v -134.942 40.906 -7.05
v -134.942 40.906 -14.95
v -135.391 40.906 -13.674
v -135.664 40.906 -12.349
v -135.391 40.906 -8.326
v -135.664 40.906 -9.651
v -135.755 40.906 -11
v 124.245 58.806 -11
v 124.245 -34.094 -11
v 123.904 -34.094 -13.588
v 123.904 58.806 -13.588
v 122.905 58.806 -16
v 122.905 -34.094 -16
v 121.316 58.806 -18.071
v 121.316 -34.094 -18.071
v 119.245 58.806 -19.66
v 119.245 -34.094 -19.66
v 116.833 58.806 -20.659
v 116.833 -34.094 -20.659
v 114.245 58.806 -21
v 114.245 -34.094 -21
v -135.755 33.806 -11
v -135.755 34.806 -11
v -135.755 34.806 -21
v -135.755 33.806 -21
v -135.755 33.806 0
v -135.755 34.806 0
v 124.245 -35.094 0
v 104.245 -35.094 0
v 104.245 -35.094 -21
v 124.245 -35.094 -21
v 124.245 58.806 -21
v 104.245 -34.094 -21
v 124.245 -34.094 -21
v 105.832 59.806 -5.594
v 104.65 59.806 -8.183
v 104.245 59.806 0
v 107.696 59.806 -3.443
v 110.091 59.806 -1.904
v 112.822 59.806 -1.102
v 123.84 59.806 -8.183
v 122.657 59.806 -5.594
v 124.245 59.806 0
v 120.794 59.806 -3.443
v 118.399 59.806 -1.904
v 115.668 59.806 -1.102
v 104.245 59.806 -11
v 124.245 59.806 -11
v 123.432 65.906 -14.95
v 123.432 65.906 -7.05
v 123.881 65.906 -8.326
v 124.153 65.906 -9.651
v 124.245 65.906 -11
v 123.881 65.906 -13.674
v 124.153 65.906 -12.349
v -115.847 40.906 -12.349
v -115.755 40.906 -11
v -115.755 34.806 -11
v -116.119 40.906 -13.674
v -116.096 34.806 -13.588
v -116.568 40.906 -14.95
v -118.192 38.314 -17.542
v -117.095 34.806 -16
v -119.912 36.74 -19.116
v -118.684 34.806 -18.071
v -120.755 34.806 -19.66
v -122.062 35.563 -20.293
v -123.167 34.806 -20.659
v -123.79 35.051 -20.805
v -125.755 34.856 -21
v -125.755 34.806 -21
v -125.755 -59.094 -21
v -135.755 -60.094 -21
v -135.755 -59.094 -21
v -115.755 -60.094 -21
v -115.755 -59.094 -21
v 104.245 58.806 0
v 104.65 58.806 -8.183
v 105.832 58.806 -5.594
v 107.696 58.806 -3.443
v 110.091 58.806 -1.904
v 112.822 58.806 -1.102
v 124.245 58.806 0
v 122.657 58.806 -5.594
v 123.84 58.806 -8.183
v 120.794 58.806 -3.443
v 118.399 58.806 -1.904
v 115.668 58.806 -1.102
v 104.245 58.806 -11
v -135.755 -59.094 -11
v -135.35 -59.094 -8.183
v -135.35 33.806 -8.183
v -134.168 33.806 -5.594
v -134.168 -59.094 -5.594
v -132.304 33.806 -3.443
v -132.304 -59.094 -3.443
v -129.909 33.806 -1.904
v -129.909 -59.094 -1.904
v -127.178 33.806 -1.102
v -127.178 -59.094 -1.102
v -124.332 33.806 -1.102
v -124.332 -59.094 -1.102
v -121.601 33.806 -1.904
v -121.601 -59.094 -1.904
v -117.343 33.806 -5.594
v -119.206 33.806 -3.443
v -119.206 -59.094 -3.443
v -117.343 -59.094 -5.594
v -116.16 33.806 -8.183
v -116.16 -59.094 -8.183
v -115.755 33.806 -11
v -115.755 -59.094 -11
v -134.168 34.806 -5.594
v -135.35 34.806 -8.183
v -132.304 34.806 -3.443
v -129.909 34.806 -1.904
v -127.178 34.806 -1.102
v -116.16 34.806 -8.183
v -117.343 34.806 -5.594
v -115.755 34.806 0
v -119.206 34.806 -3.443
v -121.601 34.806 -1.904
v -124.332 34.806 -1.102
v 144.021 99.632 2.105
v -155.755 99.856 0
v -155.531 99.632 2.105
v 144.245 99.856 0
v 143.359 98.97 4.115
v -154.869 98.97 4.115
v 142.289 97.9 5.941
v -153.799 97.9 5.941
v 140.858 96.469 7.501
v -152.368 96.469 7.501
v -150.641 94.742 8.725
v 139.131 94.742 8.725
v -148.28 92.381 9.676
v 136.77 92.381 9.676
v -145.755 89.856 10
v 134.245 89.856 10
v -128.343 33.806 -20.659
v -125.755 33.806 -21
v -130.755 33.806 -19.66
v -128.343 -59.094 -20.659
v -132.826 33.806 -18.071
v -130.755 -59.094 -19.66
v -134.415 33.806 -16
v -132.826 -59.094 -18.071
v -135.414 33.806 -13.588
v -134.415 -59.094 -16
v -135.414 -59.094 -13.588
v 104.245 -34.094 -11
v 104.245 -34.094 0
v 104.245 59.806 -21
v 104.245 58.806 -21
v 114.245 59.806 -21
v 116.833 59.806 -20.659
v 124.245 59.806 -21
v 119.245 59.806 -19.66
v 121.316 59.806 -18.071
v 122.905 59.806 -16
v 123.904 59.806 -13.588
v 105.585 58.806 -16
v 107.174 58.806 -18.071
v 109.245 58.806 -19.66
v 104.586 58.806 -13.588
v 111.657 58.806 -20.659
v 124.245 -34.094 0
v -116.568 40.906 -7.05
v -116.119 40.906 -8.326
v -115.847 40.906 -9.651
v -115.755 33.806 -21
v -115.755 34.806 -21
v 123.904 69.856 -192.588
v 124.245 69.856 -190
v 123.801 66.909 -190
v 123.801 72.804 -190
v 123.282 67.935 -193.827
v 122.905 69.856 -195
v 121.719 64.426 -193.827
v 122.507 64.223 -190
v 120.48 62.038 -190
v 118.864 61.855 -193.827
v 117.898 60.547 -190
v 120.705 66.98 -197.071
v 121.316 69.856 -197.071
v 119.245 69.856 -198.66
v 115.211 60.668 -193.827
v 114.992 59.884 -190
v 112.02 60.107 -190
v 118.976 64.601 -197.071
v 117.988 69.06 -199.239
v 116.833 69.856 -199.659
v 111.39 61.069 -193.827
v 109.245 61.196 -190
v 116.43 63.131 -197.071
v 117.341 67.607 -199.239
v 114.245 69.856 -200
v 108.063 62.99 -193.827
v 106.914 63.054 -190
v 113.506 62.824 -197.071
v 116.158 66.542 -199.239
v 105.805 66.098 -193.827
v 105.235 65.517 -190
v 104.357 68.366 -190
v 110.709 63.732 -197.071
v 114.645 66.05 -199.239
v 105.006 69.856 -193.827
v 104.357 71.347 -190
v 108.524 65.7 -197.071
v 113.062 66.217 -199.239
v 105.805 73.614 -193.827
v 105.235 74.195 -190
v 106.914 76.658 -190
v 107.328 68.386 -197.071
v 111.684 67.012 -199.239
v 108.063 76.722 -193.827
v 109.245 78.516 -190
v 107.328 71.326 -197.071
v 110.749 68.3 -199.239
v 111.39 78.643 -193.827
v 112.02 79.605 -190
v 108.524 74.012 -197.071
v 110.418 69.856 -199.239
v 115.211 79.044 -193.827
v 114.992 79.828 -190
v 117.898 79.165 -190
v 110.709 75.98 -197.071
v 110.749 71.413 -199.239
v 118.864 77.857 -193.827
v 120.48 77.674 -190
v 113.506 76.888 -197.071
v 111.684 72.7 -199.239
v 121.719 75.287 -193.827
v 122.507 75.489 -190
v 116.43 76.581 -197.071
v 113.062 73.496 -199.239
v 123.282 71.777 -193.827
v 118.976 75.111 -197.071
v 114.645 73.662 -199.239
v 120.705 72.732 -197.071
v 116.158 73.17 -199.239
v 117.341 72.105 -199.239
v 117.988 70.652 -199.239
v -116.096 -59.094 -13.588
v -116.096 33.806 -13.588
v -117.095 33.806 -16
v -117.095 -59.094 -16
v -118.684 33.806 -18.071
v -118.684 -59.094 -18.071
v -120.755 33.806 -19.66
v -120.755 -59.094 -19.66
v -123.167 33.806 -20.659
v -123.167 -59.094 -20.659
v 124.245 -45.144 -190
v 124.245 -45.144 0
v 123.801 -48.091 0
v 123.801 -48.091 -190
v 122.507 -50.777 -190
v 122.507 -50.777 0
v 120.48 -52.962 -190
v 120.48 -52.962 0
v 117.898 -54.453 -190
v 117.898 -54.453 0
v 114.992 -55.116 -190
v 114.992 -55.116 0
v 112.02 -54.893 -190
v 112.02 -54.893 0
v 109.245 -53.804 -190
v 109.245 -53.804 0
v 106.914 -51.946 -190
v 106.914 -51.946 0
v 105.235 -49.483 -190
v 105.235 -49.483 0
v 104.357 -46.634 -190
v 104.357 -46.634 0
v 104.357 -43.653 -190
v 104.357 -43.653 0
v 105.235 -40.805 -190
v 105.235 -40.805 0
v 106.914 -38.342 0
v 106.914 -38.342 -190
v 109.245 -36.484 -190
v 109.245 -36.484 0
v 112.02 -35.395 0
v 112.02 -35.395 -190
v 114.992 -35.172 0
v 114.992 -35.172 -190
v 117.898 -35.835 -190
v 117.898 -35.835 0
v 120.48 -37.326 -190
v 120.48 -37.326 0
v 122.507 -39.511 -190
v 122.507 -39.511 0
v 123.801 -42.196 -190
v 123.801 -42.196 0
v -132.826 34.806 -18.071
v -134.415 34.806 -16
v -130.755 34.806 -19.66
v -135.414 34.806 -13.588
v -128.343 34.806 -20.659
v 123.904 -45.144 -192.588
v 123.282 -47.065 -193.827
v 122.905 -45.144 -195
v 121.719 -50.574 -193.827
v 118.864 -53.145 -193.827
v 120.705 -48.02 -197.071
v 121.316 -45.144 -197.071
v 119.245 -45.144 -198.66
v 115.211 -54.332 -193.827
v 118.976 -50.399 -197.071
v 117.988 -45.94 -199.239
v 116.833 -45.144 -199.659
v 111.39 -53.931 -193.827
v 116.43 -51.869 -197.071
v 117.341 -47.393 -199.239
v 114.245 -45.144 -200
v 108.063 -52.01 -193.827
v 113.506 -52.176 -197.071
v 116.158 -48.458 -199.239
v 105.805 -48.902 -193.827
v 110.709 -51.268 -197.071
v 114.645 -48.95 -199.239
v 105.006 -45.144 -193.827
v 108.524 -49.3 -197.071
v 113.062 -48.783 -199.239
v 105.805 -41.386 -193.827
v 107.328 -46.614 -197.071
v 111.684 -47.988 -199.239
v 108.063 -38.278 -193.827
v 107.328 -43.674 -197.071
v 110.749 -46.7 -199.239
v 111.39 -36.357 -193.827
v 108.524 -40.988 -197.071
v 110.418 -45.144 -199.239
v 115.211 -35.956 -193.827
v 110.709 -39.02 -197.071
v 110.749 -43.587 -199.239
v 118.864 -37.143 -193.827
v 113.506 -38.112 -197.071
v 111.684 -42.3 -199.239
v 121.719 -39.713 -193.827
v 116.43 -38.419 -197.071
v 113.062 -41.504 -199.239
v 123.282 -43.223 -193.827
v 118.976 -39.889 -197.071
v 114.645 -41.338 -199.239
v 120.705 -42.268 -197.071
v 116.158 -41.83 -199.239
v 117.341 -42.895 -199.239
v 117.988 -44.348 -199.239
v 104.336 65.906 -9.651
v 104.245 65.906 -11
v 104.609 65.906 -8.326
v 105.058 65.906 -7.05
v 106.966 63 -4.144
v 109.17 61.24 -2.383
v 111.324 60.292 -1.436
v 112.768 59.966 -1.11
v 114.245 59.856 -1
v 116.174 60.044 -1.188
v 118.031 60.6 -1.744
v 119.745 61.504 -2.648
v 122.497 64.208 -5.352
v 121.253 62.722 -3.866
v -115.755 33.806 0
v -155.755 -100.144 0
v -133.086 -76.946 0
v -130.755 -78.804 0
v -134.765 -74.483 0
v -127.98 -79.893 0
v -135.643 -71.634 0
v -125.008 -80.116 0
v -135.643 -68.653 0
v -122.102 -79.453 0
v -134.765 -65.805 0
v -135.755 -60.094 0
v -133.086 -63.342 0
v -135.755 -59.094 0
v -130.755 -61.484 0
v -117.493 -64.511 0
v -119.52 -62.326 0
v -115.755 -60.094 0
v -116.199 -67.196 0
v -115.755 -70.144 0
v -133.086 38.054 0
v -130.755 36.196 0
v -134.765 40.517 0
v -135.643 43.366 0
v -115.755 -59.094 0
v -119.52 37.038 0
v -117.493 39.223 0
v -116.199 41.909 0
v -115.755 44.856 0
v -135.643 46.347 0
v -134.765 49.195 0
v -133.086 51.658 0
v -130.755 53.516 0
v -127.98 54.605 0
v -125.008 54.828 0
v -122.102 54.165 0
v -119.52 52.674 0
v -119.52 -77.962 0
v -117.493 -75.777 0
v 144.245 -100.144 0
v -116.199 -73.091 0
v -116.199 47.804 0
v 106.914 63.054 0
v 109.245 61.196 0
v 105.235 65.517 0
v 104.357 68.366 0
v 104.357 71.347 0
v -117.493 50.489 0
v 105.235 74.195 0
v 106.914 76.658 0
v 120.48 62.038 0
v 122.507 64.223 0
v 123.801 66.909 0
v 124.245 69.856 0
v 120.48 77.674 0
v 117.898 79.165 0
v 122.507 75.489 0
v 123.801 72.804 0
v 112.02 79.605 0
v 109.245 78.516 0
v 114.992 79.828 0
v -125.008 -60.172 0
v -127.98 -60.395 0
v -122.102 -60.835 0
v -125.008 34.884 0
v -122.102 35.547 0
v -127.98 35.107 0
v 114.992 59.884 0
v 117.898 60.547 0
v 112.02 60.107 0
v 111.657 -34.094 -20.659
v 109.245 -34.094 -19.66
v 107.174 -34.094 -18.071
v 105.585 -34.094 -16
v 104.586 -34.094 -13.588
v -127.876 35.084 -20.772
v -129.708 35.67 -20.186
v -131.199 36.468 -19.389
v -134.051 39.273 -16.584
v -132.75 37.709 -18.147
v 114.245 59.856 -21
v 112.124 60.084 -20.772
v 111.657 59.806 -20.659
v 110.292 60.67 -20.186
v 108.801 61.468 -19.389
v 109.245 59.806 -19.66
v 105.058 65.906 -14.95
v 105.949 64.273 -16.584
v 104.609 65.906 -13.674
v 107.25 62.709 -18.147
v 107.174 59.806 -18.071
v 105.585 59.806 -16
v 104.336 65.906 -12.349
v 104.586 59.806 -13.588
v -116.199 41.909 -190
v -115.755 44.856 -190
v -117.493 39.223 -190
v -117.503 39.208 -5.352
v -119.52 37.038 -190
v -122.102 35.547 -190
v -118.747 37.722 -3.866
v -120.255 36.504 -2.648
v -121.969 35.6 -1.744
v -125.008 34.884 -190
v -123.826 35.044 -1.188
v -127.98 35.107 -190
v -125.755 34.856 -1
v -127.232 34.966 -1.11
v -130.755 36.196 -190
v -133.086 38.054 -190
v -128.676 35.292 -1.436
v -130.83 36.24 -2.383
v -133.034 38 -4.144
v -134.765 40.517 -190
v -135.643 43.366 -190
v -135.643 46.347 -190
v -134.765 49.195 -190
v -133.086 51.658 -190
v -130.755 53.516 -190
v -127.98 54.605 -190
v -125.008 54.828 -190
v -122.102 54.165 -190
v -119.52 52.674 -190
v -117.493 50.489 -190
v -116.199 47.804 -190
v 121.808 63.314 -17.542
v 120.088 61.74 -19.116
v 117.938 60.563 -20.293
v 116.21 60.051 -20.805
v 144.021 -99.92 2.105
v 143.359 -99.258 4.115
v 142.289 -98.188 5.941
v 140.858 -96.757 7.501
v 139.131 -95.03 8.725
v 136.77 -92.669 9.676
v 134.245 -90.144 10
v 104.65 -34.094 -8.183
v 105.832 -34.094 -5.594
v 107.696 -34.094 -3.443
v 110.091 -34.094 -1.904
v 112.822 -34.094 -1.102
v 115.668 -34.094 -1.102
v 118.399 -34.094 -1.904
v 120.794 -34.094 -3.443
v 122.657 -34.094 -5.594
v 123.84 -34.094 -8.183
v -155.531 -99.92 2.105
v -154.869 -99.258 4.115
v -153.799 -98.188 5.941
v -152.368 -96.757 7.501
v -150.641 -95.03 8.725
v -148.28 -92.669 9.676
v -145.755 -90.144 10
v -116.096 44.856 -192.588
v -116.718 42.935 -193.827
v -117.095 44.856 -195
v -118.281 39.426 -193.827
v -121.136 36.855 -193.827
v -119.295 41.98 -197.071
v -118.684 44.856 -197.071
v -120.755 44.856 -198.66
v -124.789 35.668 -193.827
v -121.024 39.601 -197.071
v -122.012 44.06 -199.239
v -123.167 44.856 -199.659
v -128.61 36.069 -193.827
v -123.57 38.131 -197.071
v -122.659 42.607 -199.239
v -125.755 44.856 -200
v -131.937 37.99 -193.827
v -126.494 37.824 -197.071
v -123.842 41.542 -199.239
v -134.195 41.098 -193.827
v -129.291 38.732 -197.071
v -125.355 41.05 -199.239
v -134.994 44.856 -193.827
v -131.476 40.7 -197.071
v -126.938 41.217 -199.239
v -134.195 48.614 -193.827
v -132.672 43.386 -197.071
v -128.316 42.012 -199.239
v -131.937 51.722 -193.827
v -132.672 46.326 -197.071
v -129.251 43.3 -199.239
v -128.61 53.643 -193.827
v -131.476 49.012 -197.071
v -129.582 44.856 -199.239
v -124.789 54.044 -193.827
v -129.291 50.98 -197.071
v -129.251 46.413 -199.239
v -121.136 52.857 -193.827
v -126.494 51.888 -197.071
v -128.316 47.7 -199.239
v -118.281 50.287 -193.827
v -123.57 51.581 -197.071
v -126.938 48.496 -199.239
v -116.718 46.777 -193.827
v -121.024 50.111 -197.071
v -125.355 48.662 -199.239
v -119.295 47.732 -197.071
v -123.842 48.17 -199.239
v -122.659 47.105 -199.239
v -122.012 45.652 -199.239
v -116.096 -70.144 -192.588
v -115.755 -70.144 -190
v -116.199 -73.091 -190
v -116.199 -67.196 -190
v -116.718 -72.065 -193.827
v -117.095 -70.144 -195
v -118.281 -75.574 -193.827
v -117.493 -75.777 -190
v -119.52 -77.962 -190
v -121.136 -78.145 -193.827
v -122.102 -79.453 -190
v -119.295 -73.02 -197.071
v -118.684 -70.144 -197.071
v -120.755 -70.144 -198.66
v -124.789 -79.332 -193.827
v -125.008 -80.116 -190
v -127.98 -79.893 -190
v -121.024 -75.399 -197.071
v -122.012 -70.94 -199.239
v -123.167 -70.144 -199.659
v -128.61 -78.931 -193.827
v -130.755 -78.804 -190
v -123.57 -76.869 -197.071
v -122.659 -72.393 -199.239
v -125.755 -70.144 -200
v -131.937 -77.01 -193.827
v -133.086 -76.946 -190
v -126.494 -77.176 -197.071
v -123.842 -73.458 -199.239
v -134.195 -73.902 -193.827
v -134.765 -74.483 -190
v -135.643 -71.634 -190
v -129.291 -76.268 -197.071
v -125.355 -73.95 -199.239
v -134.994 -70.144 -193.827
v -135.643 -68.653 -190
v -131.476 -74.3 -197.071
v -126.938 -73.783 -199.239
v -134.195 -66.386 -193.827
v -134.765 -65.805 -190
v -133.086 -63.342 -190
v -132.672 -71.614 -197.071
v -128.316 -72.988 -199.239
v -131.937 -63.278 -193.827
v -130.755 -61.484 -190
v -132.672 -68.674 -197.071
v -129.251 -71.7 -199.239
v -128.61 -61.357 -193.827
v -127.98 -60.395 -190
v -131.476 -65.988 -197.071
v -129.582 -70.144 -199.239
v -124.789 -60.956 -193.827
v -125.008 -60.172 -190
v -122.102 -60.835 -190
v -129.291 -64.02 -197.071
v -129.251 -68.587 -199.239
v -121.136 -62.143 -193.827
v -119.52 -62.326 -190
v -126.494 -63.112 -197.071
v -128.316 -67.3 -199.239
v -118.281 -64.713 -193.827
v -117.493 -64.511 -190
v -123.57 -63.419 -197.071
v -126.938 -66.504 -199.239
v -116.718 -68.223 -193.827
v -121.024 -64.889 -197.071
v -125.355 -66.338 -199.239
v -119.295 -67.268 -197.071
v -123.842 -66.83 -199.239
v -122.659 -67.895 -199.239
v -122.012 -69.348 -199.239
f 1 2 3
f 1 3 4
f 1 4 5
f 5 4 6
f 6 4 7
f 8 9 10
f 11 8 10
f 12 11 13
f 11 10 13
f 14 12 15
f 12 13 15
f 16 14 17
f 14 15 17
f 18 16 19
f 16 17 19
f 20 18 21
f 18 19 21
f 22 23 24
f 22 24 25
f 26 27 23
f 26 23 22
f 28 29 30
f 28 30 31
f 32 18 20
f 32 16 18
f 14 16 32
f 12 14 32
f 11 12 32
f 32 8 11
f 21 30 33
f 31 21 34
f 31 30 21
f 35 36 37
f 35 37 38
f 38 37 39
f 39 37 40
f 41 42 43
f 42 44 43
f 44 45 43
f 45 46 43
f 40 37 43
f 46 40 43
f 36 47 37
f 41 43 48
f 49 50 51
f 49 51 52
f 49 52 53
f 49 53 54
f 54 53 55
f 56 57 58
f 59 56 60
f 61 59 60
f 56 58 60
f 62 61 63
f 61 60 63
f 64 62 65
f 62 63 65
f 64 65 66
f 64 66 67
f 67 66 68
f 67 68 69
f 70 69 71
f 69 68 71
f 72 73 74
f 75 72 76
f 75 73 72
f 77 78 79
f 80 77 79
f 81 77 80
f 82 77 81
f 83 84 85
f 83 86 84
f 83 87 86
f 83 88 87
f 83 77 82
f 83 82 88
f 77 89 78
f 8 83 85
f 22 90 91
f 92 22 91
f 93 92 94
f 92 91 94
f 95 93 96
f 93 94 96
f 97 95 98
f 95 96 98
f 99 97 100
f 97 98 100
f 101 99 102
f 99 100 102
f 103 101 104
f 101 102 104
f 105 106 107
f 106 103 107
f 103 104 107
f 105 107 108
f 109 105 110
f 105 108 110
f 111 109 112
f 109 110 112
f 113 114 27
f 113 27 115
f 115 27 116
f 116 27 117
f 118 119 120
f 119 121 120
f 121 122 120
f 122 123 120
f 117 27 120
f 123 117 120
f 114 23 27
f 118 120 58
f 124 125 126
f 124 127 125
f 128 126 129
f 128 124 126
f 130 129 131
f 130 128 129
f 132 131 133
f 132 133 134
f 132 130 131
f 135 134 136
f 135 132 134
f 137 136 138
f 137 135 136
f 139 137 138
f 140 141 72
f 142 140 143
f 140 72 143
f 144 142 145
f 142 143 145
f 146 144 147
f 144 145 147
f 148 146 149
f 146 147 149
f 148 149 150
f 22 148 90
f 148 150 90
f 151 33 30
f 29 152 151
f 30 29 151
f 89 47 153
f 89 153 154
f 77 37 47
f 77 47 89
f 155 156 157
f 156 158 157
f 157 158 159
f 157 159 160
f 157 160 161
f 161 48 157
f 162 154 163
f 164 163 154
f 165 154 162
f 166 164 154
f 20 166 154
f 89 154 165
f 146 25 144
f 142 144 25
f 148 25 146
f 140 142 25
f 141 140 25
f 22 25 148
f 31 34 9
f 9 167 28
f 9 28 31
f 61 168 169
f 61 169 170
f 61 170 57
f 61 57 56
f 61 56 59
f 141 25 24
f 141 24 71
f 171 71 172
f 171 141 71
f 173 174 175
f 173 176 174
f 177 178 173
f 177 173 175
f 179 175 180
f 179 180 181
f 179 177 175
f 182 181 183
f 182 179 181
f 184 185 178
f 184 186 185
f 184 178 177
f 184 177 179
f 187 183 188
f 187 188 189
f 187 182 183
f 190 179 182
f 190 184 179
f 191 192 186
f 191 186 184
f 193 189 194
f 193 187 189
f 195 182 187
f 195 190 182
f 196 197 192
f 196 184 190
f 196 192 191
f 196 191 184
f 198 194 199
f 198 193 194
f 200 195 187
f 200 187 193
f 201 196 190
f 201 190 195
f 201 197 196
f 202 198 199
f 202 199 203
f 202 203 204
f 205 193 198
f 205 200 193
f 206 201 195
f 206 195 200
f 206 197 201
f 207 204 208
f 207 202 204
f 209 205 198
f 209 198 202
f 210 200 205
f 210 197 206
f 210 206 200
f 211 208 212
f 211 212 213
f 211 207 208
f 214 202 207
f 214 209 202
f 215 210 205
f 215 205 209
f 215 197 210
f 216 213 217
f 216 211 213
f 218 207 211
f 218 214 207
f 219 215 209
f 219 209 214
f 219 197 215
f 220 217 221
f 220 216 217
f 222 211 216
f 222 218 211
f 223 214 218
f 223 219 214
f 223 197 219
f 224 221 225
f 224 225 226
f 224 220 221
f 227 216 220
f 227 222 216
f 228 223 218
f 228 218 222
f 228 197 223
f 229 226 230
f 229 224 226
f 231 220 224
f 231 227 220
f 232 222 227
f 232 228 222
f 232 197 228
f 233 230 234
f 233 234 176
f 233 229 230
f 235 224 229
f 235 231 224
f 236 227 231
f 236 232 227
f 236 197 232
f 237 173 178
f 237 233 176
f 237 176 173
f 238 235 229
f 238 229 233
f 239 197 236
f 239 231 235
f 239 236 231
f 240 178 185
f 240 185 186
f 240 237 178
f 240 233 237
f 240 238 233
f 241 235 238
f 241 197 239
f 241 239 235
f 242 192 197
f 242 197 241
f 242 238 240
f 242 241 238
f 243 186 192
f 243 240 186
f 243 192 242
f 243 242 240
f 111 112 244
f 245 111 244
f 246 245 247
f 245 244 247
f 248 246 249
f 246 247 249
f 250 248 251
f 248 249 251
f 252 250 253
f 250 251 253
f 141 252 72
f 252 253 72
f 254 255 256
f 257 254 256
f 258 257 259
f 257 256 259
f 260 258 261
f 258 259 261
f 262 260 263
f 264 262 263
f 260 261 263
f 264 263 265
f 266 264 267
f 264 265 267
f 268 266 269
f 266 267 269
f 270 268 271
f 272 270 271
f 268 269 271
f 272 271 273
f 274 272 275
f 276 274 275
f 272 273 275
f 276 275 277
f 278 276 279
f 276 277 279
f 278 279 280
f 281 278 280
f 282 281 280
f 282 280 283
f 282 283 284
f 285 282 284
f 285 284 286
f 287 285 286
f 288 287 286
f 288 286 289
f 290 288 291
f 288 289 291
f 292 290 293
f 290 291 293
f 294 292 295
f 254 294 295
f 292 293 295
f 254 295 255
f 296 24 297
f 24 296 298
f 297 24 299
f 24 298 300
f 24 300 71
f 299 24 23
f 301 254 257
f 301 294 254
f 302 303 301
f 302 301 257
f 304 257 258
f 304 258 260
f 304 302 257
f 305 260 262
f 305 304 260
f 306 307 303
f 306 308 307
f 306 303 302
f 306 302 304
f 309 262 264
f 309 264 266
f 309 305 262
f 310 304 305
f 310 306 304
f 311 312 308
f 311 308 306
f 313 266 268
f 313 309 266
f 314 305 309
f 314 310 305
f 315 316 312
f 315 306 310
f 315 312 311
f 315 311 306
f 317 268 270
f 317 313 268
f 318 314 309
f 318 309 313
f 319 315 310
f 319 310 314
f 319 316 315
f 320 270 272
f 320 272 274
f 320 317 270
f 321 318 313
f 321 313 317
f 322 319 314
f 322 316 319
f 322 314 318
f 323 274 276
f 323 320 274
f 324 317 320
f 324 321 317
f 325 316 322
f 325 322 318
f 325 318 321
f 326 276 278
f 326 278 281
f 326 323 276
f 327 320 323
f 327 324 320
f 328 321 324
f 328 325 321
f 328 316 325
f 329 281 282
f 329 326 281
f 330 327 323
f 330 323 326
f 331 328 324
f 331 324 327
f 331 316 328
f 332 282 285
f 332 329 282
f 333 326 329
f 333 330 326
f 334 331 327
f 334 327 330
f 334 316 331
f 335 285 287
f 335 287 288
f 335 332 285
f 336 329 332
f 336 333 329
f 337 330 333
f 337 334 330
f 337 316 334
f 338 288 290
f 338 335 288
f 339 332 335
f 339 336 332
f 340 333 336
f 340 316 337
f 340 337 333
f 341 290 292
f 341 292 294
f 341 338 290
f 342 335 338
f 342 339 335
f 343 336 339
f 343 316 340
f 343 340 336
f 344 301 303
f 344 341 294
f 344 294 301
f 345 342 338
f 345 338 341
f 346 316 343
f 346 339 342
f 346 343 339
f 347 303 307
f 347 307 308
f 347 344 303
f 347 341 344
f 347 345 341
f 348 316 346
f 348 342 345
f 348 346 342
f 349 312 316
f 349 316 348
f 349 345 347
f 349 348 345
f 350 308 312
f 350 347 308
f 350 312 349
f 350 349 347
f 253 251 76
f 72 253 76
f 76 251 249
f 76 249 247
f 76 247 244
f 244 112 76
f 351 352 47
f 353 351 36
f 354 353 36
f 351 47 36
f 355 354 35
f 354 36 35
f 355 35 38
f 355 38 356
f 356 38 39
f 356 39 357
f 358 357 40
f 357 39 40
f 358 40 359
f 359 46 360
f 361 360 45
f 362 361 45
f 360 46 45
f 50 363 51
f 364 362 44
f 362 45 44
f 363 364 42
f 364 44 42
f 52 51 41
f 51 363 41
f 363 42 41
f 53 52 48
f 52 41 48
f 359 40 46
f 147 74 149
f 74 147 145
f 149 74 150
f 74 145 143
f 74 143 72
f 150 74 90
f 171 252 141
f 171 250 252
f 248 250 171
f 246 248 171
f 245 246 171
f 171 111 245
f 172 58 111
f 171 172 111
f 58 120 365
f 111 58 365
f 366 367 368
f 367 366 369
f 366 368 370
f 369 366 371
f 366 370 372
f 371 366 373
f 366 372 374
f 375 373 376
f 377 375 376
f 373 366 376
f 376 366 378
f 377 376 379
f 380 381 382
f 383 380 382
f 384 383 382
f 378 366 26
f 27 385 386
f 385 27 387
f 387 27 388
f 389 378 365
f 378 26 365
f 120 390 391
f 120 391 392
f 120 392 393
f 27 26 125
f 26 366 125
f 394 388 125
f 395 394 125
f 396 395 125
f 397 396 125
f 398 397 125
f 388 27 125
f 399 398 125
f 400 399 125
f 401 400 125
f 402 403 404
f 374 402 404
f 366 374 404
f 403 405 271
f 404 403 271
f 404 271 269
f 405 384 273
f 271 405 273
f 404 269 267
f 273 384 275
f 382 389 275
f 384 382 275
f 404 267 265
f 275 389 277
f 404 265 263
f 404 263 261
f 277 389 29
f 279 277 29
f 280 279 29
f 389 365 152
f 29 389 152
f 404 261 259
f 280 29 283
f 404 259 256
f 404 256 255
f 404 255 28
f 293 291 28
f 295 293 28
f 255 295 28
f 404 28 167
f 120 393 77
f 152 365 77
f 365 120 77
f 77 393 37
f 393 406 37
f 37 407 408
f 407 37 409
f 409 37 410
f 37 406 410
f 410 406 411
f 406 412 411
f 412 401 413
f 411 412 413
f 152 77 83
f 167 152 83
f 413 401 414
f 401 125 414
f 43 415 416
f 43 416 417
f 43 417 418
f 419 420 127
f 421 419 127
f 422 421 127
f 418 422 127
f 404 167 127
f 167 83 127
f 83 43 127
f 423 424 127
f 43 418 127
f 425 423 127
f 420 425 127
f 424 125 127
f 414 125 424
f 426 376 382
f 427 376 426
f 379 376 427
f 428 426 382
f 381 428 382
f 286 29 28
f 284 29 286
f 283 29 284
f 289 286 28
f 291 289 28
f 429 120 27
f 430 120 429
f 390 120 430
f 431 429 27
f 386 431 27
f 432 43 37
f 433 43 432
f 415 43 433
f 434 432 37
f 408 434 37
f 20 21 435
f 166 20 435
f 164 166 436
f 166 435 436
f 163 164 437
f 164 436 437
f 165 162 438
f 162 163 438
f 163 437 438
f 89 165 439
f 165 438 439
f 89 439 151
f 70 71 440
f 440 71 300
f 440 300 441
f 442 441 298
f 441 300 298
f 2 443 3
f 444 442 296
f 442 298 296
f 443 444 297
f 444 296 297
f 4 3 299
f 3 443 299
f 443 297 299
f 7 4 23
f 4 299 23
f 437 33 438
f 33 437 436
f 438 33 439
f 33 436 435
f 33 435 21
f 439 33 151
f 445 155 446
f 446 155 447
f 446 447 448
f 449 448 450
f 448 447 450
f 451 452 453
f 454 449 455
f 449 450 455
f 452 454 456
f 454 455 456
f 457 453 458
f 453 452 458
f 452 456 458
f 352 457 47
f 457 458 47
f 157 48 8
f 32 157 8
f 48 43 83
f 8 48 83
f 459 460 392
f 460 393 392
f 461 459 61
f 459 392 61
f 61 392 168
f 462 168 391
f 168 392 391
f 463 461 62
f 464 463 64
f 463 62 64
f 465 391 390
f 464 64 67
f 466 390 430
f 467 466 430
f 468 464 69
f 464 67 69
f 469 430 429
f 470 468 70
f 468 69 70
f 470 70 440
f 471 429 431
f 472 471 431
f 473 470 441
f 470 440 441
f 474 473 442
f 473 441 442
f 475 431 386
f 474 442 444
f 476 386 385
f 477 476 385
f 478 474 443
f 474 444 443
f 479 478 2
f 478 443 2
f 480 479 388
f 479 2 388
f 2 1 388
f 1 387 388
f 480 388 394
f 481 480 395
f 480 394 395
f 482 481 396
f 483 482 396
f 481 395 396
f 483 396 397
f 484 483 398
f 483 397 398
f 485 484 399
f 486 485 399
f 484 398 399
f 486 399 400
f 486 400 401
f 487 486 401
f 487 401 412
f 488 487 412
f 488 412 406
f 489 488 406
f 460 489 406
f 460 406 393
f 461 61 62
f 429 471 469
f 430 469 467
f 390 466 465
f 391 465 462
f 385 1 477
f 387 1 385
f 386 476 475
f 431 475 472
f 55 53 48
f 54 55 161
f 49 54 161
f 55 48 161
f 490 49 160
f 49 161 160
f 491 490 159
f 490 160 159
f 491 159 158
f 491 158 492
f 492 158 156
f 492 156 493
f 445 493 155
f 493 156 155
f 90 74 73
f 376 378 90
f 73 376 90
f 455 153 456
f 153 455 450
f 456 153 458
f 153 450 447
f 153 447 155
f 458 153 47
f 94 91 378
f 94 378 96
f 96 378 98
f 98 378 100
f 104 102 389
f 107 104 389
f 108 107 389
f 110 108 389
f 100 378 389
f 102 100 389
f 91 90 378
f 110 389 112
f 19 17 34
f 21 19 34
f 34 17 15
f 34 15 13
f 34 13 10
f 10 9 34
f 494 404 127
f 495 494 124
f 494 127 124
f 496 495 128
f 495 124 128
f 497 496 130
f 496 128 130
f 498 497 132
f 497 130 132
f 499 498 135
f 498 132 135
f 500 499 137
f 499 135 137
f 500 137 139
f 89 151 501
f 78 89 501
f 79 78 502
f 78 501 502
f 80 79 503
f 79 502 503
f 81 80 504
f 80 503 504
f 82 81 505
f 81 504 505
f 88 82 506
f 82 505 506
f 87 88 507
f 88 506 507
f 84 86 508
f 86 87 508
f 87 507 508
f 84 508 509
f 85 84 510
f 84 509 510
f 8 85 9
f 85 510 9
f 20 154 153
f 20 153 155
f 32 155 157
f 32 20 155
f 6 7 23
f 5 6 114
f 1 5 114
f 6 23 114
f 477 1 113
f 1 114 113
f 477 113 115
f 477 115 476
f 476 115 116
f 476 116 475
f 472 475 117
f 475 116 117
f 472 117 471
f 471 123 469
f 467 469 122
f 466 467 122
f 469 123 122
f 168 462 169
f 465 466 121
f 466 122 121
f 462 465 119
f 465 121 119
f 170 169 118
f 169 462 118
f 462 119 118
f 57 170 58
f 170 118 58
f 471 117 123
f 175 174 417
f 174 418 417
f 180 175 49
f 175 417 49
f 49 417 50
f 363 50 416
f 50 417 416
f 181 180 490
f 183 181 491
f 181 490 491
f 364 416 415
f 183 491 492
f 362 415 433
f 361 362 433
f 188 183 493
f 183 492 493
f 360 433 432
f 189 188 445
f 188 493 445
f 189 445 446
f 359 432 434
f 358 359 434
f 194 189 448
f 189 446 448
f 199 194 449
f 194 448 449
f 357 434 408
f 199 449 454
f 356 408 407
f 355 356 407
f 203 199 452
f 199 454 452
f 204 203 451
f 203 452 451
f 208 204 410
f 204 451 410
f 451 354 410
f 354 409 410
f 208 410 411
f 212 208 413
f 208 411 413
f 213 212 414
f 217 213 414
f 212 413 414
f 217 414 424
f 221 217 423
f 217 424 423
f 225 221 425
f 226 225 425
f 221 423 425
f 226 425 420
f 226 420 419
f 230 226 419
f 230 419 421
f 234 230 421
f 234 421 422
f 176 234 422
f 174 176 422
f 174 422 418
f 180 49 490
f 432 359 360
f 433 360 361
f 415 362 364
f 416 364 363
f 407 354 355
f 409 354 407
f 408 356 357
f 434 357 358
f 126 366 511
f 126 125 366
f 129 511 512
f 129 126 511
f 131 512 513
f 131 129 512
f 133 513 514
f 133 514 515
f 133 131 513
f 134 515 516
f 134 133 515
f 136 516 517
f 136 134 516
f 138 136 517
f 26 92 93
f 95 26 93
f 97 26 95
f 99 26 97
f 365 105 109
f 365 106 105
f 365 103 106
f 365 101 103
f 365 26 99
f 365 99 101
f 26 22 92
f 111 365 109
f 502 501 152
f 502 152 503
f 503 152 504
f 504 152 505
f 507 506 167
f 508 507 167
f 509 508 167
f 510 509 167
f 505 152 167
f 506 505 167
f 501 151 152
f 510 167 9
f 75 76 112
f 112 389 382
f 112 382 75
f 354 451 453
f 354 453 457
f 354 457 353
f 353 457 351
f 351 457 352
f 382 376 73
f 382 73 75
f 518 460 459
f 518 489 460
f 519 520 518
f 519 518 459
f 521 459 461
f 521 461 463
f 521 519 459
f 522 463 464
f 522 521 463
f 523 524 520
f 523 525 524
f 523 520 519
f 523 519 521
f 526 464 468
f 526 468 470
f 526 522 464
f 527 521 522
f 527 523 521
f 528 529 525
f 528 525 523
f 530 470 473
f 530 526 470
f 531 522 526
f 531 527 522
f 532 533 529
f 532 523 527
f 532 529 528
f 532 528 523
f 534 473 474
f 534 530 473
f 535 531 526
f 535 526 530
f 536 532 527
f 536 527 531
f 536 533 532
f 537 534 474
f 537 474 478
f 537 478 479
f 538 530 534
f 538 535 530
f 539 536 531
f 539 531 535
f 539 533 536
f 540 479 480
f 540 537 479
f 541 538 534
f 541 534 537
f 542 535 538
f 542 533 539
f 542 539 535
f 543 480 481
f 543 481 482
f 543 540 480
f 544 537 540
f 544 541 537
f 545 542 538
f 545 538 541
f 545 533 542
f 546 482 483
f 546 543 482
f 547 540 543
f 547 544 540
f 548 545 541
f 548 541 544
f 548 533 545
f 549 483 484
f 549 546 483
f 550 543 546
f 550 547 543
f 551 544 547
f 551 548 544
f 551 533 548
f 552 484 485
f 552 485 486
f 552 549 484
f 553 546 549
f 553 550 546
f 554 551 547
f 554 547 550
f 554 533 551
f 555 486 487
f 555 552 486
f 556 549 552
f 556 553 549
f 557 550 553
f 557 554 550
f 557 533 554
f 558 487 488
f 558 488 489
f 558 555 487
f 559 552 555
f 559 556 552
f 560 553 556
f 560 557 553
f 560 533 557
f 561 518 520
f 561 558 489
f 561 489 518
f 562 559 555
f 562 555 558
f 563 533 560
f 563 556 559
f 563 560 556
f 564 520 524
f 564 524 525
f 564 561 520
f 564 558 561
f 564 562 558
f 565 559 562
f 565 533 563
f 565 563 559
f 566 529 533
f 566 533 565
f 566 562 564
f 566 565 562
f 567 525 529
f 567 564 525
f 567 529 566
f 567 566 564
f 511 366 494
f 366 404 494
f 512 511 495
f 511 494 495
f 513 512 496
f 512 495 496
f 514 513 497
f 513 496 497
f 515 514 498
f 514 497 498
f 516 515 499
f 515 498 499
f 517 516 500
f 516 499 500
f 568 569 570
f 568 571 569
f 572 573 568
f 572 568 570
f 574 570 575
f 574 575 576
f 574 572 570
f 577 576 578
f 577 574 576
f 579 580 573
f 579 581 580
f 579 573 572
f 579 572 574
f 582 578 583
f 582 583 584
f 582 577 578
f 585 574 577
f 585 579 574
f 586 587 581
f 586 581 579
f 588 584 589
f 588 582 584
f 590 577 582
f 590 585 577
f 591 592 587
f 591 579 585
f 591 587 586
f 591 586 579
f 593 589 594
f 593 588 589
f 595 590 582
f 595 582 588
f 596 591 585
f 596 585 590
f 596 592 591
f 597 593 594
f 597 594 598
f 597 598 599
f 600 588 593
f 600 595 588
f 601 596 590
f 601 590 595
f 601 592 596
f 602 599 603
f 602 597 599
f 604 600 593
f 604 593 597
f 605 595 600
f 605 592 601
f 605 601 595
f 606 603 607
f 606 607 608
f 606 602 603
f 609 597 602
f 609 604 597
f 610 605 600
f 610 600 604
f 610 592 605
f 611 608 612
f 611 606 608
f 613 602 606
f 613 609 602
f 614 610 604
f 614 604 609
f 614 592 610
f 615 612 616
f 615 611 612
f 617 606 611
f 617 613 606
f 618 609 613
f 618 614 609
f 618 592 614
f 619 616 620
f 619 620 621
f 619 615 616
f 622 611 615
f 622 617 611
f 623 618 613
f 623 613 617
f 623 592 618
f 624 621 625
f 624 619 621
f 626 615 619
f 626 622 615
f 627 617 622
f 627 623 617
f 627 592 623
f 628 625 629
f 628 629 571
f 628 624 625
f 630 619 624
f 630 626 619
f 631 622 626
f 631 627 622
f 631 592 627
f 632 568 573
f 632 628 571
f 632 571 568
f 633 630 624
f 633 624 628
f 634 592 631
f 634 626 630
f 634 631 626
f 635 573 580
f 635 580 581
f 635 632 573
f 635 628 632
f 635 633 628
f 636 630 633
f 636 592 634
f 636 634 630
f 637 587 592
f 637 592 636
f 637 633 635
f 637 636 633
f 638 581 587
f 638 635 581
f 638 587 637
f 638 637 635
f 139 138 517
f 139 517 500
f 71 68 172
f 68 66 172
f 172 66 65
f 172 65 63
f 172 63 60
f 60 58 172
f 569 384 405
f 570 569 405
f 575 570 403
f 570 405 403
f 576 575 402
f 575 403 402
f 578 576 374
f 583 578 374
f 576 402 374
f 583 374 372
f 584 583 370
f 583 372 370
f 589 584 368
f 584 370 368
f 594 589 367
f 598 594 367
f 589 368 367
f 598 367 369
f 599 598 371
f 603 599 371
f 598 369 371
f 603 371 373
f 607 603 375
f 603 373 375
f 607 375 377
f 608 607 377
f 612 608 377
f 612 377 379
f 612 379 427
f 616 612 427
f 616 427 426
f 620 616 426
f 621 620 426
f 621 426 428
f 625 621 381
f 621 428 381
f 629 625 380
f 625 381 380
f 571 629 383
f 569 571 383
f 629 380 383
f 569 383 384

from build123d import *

# Parameters (mm, degrees)
F0_W     = 300
F0_H     = 200
F1_DEPTH = 10
F2_R     = 10
F3_DEPTH = 200
F4_R     = 10
F5_W     = 20
F5_H     = 1
F6_DEPTH = 21
F9_DEPTH = 100
F10_R    = 9.99999


# Not quite as in the source:
# - a fillet or chamfer is up to 0.001 mm smaller than in the source, because OpenCascade refuses the exact size


with BuildPart() as f1:
    # F0 (on Top) → F1 (new body)
    with BuildSketch(Plane.XY):
        with Locations((-5.7550377341, -0.1439023763)):
            Rectangle(F0_W, F0_H)
    extrude(amount=F1_DEPTH)

    # F2 (on face) → F3 (join)
    with BuildSketch(Plane(origin=(0, 0, 0), x_dir=(1, 0, 0), z_dir=(0, 0, -1))):
        with Locations((-125.7550377341, 70.1439023763)):
            Circle(F2_R)
        with Locations((-125.7550377341, -44.8560976237)):
            Circle(F2_R)
        with Locations((114.2449622659, 45.1439023763)):
            Circle(F2_R)
        with Locations((114.2449622659, -69.8560976237)):
            Circle(F2_R)
    extrude(amount=F3_DEPTH)

    # F4
    f4_edges = [f1.edges().sort_by_distance(p)[0] for p in [
        (-135.755038, -70.143902, -200),
        (-135.755038, 44.856098, -200),
        (104.244962, -45.143902, -200),
        (104.244962, 69.856098, -200),
    ]]
    fillet(f4_edges, radius=F4_R)

    # F5 (on face) → F6 (join)
    with BuildSketch(Plane(origin=(0, 0, 0), x_dir=(1, 0, 0), z_dir=(0, 0, -1))):
        with Locations((-125.7550377341, 59.5939023763)):
            Rectangle(F5_W, F5_H)
        with Locations((-125.7550377341, -34.3060976237)):
            Rectangle(F5_W, F5_H)
        with Locations((114.2449622659, -59.3060976237)):
            Rectangle(F5_W, F5_H)
        with Locations((114.2449622659, 34.5939023763)):
            Rectangle(F5_W, F5_H)
    extrude(amount=F6_DEPTH)

    # F7 (on face) + F8 (on face) → F9 (join)
    with BuildSketch(Plane(origin=(0, -59.0939023763, 0), x_dir=(-1, 0, 0), z_dir=(0, 1, 0))):
        with BuildLine():
            ThreePointArc((125.755037734, -21), (132.8261055459, -18.0710678119), (135.7550377341, -11))
            ThreePointArc((135.7550377341, -11), (125.7550377341, -1), (115.7550377341, -11))
            ThreePointArc((115.7550377341, -11), (118.6839699222, -18.0710678119), (125.755037734, -21))
        make_face()
    with BuildSketch(Plane(origin=(0, -34.0939023763, 0), x_dir=(-1, 0, 0), z_dir=(0, 1, 0))):
        with BuildLine():
            ThreePointArc((-114.244962266, -21), (-107.1738944541, -18.0710678119), (-104.2449622659, -11))
            ThreePointArc((-104.2449622659, -11), (-114.2449622659, -1), (-124.2449622659, -11))
            ThreePointArc((-124.2449622659, -11), (-121.3160300778, -18.0710678119), (-114.244962266, -21))
        make_face()
    extrude(amount=F9_DEPTH)

    # F10 (radius 10 in the source; OpenCascade refuses exactly that, so slightly less here)
    f10_edges = [f1.edges().sort_by_distance(p)[0] for p in [
        (-155.755038, -0.143902, 10),
        (-5.755038, 99.856098, 10),
        (144.244962, -0.143902, 10),
        (-5.755038, -100.143902, 10),
    ]]
    fillet(f10_edges, radius=F10_R)


solid = f1.part
